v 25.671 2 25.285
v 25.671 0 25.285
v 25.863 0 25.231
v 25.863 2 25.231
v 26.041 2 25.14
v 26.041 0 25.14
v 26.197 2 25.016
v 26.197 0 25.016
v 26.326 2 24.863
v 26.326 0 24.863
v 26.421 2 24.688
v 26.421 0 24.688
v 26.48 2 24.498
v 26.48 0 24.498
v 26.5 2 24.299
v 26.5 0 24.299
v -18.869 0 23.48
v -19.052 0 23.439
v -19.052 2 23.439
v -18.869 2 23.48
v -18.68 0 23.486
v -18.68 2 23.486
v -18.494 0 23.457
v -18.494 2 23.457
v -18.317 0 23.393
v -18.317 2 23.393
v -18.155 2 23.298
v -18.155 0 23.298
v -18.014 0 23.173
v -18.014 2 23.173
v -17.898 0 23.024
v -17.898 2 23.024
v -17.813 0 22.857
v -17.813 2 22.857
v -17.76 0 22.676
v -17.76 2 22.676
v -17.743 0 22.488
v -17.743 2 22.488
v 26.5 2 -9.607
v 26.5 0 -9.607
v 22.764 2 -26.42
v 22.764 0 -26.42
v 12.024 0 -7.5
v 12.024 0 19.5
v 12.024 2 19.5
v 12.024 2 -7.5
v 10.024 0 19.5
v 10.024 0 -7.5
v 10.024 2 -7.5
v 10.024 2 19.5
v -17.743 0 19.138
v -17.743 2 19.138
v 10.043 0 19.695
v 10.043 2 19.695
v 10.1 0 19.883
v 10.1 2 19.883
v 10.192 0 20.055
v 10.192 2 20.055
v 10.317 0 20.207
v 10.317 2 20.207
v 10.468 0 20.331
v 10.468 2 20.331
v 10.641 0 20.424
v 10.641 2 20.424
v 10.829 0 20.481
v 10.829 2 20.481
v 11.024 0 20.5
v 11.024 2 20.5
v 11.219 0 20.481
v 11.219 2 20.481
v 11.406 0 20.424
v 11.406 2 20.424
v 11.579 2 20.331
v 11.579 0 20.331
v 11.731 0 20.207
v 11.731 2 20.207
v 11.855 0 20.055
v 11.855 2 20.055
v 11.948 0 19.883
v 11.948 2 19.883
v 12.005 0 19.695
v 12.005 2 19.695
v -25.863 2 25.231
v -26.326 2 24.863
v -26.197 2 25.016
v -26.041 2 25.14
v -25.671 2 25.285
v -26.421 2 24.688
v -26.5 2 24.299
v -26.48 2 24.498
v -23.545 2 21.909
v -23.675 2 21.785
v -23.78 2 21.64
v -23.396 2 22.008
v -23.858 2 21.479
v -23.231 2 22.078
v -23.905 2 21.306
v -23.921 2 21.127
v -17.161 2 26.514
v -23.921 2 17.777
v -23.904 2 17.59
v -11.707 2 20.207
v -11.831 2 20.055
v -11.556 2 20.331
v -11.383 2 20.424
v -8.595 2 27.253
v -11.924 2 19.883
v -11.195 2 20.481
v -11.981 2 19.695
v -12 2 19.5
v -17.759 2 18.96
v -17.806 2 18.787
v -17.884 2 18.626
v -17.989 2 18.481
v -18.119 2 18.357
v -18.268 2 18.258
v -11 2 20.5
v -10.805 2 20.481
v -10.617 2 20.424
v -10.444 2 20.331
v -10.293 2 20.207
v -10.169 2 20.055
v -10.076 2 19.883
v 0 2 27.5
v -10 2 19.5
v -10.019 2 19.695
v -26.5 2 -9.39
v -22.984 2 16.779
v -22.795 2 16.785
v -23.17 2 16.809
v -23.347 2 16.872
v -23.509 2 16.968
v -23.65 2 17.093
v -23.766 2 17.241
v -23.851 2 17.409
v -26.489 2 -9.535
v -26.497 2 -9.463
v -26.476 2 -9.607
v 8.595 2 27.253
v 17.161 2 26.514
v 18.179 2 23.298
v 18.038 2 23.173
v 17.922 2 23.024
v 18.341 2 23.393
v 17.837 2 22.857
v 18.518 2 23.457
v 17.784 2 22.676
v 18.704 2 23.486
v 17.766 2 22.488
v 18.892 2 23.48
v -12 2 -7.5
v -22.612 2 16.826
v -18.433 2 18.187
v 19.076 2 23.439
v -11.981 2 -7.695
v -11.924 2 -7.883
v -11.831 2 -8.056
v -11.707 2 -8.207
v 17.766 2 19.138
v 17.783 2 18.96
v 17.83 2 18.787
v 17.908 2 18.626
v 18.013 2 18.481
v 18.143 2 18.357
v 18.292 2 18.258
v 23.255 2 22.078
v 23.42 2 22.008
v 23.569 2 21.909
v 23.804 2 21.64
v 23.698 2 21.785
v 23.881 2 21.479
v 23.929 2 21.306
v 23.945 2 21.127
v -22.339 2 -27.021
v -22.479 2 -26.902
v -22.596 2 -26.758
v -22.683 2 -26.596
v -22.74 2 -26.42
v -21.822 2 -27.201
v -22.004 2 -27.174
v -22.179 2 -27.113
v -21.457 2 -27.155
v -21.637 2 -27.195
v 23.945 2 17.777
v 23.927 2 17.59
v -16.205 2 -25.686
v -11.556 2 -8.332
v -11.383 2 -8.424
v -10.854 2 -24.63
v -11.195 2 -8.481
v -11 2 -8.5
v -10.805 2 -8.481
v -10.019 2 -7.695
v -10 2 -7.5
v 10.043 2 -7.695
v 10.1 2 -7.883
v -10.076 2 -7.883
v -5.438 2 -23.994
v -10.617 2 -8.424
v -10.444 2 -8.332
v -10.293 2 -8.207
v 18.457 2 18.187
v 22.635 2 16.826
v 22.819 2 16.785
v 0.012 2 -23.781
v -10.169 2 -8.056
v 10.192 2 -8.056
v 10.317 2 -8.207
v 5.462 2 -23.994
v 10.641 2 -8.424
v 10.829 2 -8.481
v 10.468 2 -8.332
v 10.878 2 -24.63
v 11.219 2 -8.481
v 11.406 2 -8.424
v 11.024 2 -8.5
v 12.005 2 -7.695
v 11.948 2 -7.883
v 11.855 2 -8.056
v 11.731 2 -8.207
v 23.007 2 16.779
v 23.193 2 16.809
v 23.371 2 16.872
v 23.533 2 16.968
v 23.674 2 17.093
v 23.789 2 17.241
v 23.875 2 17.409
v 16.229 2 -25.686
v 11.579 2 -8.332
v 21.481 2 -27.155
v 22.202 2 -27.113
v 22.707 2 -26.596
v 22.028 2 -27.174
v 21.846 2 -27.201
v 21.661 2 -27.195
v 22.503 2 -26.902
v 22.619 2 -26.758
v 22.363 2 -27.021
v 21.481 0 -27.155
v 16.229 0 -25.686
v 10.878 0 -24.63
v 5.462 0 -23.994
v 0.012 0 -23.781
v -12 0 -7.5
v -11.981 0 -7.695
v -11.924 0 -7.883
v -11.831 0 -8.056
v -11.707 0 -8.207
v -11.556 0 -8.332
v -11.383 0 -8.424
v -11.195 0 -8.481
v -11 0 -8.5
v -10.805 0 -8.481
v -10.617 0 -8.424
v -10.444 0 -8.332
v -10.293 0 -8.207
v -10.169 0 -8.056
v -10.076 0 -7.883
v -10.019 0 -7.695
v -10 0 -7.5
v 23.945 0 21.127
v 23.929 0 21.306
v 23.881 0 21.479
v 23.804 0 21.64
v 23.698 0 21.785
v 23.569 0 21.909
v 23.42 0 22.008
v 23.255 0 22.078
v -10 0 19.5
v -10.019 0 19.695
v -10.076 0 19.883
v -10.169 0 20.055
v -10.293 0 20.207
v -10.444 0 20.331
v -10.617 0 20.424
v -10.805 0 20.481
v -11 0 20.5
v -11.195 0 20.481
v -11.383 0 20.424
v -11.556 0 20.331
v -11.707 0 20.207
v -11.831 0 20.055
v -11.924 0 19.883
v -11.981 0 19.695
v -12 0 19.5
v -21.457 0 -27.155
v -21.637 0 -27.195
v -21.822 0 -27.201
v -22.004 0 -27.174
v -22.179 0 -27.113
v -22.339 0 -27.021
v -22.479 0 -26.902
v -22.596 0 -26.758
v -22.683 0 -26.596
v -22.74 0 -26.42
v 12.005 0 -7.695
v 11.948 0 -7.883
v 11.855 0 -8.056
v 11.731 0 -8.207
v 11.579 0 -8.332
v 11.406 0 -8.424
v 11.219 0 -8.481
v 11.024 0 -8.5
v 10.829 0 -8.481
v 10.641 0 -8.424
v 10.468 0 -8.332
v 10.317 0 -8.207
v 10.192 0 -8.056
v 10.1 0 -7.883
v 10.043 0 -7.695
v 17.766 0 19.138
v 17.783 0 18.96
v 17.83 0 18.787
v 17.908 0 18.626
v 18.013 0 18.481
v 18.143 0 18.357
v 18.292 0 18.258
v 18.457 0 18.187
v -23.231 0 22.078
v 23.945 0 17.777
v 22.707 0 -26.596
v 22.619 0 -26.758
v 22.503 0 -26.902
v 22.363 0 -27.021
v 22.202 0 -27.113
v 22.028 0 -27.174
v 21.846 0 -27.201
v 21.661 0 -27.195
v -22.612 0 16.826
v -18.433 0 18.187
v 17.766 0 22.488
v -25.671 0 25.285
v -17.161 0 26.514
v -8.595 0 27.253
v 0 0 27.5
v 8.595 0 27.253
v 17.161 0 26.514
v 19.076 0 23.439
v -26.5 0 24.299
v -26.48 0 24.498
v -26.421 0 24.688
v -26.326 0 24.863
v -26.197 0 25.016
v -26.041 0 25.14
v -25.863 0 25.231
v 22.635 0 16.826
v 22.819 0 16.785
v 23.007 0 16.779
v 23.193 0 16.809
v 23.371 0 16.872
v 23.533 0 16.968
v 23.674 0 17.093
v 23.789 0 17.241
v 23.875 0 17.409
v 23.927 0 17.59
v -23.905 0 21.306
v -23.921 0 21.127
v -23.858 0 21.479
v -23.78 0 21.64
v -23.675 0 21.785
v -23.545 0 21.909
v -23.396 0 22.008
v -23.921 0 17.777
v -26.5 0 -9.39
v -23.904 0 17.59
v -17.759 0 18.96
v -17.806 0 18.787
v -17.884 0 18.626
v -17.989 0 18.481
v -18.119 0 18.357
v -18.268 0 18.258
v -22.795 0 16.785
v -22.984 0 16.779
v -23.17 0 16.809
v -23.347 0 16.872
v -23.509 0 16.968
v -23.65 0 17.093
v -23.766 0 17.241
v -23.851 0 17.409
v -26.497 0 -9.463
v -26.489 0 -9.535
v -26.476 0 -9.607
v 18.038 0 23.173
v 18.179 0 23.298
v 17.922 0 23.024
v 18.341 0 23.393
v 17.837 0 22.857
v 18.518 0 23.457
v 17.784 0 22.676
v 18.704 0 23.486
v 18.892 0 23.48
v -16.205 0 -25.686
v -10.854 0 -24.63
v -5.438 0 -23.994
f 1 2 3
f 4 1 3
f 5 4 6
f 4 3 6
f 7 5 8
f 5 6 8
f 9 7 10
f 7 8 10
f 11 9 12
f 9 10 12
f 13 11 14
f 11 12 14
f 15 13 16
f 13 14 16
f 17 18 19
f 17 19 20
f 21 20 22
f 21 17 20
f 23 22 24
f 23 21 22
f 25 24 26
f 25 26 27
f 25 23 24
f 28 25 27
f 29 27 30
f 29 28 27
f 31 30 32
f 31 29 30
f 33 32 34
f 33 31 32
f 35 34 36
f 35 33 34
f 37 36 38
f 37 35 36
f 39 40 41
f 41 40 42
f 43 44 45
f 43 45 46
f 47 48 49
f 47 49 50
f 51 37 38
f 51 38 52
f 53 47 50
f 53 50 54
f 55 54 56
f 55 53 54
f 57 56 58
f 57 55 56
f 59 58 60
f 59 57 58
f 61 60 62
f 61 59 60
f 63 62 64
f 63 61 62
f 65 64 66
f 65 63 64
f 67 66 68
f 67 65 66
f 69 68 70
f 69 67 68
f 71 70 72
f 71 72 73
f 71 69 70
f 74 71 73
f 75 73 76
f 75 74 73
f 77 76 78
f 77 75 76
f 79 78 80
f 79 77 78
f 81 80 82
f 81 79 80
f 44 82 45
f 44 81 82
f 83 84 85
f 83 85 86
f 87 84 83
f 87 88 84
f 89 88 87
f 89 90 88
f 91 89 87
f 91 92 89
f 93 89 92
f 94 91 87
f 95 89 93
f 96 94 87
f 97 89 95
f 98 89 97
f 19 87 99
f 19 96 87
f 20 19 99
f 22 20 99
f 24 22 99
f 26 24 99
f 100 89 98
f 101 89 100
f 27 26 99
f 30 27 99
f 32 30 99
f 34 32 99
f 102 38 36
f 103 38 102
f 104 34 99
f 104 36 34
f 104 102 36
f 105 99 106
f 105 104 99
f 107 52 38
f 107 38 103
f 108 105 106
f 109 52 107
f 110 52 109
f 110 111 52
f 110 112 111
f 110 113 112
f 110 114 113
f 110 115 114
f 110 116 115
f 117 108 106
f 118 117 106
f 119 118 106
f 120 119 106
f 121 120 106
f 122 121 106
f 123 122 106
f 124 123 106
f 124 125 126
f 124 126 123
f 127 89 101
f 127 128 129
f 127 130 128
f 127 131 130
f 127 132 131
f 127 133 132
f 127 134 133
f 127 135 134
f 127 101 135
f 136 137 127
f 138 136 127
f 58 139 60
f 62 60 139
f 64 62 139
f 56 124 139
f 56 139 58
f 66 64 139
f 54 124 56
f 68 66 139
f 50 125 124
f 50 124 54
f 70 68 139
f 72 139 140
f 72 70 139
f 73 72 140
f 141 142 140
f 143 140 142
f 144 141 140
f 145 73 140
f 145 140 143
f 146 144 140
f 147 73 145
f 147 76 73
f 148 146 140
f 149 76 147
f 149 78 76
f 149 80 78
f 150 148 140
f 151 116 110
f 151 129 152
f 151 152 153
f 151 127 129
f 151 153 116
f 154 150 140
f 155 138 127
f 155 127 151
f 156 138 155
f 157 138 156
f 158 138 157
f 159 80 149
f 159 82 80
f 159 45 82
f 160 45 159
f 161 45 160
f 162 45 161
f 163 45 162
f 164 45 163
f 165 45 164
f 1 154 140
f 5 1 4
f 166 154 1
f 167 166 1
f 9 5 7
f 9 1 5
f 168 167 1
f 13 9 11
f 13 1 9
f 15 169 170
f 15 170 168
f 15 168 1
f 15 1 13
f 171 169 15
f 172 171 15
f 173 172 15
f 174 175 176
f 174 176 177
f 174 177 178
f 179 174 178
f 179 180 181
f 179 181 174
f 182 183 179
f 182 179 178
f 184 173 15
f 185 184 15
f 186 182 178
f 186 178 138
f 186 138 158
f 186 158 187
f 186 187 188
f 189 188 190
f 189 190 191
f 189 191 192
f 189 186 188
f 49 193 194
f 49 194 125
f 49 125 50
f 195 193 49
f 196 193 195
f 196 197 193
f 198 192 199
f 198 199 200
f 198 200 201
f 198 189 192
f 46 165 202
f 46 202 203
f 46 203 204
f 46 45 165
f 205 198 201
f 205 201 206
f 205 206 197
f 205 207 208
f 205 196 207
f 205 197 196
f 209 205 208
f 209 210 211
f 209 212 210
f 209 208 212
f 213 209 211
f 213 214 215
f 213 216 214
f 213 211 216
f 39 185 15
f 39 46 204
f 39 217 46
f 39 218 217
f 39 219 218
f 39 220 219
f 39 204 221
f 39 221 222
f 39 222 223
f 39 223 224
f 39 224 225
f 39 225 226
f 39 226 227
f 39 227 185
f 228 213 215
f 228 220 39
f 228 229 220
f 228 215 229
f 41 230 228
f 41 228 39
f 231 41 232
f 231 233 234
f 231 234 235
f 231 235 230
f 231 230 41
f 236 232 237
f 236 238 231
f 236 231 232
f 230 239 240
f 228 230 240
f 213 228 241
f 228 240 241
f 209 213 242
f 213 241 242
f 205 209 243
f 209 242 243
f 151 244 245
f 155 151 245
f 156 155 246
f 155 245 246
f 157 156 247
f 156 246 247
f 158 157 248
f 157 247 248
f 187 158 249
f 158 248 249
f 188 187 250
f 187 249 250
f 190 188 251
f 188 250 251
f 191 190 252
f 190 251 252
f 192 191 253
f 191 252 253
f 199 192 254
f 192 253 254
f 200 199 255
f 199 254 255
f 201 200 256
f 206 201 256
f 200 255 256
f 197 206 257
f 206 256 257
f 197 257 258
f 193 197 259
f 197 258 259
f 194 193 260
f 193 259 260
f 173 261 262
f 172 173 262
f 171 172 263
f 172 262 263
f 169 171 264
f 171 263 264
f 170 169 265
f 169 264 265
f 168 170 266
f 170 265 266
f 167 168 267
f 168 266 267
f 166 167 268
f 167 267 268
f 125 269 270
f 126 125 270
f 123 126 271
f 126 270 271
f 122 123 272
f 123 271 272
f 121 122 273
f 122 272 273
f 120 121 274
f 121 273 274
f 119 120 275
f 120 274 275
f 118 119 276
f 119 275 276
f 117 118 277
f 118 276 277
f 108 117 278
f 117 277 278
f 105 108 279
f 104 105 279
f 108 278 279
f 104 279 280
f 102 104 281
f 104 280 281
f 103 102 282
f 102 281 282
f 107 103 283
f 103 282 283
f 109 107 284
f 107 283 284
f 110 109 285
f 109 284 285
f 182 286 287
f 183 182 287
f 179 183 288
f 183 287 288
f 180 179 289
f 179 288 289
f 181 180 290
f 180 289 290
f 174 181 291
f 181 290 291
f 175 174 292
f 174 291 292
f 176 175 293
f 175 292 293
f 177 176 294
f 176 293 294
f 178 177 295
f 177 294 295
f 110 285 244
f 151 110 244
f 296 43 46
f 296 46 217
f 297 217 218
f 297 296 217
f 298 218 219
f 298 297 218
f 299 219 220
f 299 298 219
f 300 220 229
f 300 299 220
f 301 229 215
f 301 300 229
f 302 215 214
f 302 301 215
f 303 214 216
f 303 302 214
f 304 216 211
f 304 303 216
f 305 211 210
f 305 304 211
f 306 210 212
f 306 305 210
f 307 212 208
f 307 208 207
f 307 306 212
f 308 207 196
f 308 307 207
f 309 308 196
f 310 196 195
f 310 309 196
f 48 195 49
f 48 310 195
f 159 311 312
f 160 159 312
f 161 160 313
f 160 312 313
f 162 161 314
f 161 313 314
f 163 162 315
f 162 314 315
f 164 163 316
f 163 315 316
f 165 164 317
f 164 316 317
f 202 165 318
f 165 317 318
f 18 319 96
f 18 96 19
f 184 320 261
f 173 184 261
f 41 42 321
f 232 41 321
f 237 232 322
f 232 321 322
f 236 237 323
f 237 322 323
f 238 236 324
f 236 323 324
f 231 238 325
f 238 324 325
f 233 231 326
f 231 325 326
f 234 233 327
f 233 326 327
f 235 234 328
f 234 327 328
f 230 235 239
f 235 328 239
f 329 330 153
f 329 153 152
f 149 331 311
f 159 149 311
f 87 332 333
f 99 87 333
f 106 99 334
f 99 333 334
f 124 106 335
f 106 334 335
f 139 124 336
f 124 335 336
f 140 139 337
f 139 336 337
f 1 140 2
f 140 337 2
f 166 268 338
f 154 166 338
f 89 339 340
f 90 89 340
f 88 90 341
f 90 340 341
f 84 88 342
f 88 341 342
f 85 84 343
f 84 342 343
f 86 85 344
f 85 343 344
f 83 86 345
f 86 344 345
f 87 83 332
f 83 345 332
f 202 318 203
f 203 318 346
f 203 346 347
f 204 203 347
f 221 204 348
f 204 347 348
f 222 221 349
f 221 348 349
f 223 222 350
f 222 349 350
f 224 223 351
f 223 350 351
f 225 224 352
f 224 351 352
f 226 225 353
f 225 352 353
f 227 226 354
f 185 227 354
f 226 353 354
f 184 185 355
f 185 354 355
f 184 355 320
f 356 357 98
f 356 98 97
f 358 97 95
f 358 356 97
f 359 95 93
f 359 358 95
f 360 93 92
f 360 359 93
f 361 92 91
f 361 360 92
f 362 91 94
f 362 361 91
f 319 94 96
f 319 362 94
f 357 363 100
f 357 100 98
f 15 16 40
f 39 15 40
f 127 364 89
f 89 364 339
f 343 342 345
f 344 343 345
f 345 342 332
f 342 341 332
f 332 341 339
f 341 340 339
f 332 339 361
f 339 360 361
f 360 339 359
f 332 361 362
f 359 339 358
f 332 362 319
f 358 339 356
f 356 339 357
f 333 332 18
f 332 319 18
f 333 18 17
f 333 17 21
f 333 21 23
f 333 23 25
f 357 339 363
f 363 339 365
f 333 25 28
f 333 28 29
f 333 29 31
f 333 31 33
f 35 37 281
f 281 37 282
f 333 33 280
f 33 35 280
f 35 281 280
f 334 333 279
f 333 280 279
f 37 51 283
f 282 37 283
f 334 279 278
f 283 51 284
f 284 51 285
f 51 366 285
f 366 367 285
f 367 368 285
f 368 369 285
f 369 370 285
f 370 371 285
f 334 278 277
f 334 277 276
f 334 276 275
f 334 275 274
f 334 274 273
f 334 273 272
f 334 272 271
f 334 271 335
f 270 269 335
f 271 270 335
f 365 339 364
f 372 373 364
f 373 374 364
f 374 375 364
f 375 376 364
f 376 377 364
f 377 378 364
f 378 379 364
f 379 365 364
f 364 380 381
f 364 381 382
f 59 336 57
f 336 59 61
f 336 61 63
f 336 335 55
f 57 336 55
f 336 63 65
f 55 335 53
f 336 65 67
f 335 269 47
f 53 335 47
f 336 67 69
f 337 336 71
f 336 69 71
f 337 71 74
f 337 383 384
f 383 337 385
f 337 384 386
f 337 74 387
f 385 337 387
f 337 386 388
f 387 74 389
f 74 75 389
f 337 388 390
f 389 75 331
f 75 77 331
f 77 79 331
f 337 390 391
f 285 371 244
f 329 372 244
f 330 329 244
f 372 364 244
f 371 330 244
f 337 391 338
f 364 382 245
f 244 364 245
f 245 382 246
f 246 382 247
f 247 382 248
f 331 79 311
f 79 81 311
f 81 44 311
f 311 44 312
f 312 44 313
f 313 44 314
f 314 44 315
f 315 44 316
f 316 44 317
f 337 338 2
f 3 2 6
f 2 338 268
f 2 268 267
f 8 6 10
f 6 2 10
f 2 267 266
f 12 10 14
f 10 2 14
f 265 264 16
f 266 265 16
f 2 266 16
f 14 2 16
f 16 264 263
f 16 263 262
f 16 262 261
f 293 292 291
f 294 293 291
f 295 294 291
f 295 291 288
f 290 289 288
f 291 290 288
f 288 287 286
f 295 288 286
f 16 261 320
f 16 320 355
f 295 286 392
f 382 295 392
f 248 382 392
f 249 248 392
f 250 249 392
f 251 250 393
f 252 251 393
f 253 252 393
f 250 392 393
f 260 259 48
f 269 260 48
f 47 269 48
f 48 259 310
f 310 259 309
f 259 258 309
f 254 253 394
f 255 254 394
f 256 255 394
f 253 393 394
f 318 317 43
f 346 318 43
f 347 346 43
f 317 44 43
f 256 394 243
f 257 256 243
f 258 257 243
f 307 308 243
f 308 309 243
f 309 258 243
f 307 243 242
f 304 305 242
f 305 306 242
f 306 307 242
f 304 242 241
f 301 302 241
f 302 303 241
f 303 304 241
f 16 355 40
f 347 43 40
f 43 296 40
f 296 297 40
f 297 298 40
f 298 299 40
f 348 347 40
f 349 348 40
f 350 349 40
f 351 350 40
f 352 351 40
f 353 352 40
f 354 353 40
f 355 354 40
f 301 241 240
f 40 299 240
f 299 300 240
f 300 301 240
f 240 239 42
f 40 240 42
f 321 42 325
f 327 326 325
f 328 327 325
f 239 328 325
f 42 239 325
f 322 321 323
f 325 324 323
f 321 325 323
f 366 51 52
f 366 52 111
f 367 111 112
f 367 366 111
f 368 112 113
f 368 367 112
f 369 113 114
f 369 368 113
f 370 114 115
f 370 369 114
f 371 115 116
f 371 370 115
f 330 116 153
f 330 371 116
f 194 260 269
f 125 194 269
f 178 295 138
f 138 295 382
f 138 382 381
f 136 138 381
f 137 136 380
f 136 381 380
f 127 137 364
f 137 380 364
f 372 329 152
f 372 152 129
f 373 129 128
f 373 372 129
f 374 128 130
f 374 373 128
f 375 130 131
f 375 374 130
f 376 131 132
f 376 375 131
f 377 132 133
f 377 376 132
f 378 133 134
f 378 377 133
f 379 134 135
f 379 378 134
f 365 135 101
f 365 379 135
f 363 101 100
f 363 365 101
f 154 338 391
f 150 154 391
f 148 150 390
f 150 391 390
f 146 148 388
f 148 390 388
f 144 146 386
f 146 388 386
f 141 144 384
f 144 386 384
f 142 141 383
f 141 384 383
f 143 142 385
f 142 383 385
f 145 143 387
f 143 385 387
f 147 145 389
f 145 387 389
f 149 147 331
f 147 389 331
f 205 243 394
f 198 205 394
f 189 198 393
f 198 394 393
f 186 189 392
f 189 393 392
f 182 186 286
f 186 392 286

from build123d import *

# Parameters (mm, degrees)
RESSALTO_EXTRUS_O1_DEPTH = 2


with BuildPart() as part:
    # Esboço1 → Ressalto-extrusão1 (new body)
    with BuildSketch(Plane(origin=(0, 0, 0), x_dir=(1, 0, 0), z_dir=(0, 1, 0))):
        with BuildLine():
            Line((-22.739996026, 26.420017885), (-26.47618706, 9.607158229))
            ThreePointArc((-26.47618706, 9.607158229), (-26.494028938, 9.499344543), (-26.5, 9.390227771))
            Line((-26.5, 9.390227771), (-26.5, -24.299313819))
            ThreePointArc((-26.5, -24.299313819), (-26.265286485, -24.943003648), (-25.671326807, -25.284528072))
            ThreePointArc((-25.671326807, -25.284528072), (0, -27.5), (25.671326807, -25.284528072))
            ThreePointArc((25.671326807, -25.284528072), (26.265286485, -24.943003648), (26.5, -24.299313819))
            Line((26.5, -24.299313819), (26.5, 9.607158229))
            Line((26.5, 9.607158229), (22.763808965, 26.420017885))
            ThreePointArc((22.763808965, 26.420017885), (22.284676967, 27.070806428), (21.480921688, 27.154893592))
            ThreePointArc((21.480921688, 27.154893592), (10.878133716, 24.629860221), (0.01190647, 23.781325176))
            ThreePointArc((0.01190647, 23.781325176), (-10.854320777, 24.629860221), (-21.457108748, 27.154893592))
            ThreePointArc((-21.457108748, 27.154893592), (-22.260864027, 27.070806428), (-22.739996026, 26.420017885))
        make_face()
        with BuildLine():
            Line((23.945153985, -17.77729625), (23.945153985, -21.127458538))
            ThreePointArc((23.945153985, -21.127458538), (23.754375079, -21.714962769), (23.254831543, -22.07830017))
            Line((23.254831543, -22.07830017), (19.076176544, -23.439237296))
            ThreePointArc((19.076176544, -23.439237296), (18.178994755, -23.297616757), (17.766498985, -22.488395663))
            Line((17.766498985, -22.488395663), (17.766498985, -19.138233375))
            ThreePointArc((17.766498985, -19.138233375), (17.957277891, -18.550729144), (18.456821427, -18.187391742))
            Line((18.456821427, -18.187391742), (22.635476426, -16.826454617))
            ThreePointArc((22.635476426, -16.826454617), (23.532658215, -16.968075156), (23.945153985, -17.77729625))
        make_face(mode=Mode.SUBTRACT)
        with BuildLine():
            Line((-10, 7.500138791), (-10, -19.499861209))
            ThreePointArc((-10, -19.499861209), (-11, -20.499861209), (-12, -19.499861209))
            Line((-12, -19.499861209), (-12, 7.500138791))
            ThreePointArc((-12, 7.500138791), (-11, 8.500138791), (-10, 7.500138791))
        make_face(mode=Mode.SUBTRACT)
        with BuildLine():
            Line((-23.231018603, -22.07830017), (-19.052363604, -23.439237296))
            ThreePointArc((-19.052363604, -23.439237296), (-18.155181815, -23.297616757), (-17.742686046, -22.488395663))
            Line((-17.742686046, -22.488395663), (-17.742686046, -19.138233375))
            ThreePointArc((-17.742686046, -19.138233375), (-17.933464951, -18.550729144), (-18.433008487, -18.187391742))
            Line((-18.433008487, -18.187391742), (-22.611663487, -16.826454617))
            ThreePointArc((-22.611663487, -16.826454617), (-23.508845275, -16.968075156), (-23.921341045, -17.77729625))
            Line((-23.921341045, -17.77729625), (-23.921341045, -21.127458538))
            ThreePointArc((-23.921341045, -21.127458538), (-23.730562139, -21.714962769), (-23.231018603, -22.07830017))
        make_face(mode=Mode.SUBTRACT)
        with BuildLine():
            Line((10.02381294, 7.500138791), (10.02381294, -19.499861209))
            ThreePointArc((10.02381294, -19.499861209), (11.02381294, -20.499861209), (12.02381294, -19.499861209))
            Line((12.02381294, -19.499861209), (12.02381294, 7.500138791))
            ThreePointArc((12.02381294, 7.500138791), (11.02381294, 8.500138791), (10.02381294, 7.500138791))
        make_face(mode=Mode.SUBTRACT)
    extrude(amount=RESSALTO_EXTRUS_O1_DEPTH)


solid = part.part
